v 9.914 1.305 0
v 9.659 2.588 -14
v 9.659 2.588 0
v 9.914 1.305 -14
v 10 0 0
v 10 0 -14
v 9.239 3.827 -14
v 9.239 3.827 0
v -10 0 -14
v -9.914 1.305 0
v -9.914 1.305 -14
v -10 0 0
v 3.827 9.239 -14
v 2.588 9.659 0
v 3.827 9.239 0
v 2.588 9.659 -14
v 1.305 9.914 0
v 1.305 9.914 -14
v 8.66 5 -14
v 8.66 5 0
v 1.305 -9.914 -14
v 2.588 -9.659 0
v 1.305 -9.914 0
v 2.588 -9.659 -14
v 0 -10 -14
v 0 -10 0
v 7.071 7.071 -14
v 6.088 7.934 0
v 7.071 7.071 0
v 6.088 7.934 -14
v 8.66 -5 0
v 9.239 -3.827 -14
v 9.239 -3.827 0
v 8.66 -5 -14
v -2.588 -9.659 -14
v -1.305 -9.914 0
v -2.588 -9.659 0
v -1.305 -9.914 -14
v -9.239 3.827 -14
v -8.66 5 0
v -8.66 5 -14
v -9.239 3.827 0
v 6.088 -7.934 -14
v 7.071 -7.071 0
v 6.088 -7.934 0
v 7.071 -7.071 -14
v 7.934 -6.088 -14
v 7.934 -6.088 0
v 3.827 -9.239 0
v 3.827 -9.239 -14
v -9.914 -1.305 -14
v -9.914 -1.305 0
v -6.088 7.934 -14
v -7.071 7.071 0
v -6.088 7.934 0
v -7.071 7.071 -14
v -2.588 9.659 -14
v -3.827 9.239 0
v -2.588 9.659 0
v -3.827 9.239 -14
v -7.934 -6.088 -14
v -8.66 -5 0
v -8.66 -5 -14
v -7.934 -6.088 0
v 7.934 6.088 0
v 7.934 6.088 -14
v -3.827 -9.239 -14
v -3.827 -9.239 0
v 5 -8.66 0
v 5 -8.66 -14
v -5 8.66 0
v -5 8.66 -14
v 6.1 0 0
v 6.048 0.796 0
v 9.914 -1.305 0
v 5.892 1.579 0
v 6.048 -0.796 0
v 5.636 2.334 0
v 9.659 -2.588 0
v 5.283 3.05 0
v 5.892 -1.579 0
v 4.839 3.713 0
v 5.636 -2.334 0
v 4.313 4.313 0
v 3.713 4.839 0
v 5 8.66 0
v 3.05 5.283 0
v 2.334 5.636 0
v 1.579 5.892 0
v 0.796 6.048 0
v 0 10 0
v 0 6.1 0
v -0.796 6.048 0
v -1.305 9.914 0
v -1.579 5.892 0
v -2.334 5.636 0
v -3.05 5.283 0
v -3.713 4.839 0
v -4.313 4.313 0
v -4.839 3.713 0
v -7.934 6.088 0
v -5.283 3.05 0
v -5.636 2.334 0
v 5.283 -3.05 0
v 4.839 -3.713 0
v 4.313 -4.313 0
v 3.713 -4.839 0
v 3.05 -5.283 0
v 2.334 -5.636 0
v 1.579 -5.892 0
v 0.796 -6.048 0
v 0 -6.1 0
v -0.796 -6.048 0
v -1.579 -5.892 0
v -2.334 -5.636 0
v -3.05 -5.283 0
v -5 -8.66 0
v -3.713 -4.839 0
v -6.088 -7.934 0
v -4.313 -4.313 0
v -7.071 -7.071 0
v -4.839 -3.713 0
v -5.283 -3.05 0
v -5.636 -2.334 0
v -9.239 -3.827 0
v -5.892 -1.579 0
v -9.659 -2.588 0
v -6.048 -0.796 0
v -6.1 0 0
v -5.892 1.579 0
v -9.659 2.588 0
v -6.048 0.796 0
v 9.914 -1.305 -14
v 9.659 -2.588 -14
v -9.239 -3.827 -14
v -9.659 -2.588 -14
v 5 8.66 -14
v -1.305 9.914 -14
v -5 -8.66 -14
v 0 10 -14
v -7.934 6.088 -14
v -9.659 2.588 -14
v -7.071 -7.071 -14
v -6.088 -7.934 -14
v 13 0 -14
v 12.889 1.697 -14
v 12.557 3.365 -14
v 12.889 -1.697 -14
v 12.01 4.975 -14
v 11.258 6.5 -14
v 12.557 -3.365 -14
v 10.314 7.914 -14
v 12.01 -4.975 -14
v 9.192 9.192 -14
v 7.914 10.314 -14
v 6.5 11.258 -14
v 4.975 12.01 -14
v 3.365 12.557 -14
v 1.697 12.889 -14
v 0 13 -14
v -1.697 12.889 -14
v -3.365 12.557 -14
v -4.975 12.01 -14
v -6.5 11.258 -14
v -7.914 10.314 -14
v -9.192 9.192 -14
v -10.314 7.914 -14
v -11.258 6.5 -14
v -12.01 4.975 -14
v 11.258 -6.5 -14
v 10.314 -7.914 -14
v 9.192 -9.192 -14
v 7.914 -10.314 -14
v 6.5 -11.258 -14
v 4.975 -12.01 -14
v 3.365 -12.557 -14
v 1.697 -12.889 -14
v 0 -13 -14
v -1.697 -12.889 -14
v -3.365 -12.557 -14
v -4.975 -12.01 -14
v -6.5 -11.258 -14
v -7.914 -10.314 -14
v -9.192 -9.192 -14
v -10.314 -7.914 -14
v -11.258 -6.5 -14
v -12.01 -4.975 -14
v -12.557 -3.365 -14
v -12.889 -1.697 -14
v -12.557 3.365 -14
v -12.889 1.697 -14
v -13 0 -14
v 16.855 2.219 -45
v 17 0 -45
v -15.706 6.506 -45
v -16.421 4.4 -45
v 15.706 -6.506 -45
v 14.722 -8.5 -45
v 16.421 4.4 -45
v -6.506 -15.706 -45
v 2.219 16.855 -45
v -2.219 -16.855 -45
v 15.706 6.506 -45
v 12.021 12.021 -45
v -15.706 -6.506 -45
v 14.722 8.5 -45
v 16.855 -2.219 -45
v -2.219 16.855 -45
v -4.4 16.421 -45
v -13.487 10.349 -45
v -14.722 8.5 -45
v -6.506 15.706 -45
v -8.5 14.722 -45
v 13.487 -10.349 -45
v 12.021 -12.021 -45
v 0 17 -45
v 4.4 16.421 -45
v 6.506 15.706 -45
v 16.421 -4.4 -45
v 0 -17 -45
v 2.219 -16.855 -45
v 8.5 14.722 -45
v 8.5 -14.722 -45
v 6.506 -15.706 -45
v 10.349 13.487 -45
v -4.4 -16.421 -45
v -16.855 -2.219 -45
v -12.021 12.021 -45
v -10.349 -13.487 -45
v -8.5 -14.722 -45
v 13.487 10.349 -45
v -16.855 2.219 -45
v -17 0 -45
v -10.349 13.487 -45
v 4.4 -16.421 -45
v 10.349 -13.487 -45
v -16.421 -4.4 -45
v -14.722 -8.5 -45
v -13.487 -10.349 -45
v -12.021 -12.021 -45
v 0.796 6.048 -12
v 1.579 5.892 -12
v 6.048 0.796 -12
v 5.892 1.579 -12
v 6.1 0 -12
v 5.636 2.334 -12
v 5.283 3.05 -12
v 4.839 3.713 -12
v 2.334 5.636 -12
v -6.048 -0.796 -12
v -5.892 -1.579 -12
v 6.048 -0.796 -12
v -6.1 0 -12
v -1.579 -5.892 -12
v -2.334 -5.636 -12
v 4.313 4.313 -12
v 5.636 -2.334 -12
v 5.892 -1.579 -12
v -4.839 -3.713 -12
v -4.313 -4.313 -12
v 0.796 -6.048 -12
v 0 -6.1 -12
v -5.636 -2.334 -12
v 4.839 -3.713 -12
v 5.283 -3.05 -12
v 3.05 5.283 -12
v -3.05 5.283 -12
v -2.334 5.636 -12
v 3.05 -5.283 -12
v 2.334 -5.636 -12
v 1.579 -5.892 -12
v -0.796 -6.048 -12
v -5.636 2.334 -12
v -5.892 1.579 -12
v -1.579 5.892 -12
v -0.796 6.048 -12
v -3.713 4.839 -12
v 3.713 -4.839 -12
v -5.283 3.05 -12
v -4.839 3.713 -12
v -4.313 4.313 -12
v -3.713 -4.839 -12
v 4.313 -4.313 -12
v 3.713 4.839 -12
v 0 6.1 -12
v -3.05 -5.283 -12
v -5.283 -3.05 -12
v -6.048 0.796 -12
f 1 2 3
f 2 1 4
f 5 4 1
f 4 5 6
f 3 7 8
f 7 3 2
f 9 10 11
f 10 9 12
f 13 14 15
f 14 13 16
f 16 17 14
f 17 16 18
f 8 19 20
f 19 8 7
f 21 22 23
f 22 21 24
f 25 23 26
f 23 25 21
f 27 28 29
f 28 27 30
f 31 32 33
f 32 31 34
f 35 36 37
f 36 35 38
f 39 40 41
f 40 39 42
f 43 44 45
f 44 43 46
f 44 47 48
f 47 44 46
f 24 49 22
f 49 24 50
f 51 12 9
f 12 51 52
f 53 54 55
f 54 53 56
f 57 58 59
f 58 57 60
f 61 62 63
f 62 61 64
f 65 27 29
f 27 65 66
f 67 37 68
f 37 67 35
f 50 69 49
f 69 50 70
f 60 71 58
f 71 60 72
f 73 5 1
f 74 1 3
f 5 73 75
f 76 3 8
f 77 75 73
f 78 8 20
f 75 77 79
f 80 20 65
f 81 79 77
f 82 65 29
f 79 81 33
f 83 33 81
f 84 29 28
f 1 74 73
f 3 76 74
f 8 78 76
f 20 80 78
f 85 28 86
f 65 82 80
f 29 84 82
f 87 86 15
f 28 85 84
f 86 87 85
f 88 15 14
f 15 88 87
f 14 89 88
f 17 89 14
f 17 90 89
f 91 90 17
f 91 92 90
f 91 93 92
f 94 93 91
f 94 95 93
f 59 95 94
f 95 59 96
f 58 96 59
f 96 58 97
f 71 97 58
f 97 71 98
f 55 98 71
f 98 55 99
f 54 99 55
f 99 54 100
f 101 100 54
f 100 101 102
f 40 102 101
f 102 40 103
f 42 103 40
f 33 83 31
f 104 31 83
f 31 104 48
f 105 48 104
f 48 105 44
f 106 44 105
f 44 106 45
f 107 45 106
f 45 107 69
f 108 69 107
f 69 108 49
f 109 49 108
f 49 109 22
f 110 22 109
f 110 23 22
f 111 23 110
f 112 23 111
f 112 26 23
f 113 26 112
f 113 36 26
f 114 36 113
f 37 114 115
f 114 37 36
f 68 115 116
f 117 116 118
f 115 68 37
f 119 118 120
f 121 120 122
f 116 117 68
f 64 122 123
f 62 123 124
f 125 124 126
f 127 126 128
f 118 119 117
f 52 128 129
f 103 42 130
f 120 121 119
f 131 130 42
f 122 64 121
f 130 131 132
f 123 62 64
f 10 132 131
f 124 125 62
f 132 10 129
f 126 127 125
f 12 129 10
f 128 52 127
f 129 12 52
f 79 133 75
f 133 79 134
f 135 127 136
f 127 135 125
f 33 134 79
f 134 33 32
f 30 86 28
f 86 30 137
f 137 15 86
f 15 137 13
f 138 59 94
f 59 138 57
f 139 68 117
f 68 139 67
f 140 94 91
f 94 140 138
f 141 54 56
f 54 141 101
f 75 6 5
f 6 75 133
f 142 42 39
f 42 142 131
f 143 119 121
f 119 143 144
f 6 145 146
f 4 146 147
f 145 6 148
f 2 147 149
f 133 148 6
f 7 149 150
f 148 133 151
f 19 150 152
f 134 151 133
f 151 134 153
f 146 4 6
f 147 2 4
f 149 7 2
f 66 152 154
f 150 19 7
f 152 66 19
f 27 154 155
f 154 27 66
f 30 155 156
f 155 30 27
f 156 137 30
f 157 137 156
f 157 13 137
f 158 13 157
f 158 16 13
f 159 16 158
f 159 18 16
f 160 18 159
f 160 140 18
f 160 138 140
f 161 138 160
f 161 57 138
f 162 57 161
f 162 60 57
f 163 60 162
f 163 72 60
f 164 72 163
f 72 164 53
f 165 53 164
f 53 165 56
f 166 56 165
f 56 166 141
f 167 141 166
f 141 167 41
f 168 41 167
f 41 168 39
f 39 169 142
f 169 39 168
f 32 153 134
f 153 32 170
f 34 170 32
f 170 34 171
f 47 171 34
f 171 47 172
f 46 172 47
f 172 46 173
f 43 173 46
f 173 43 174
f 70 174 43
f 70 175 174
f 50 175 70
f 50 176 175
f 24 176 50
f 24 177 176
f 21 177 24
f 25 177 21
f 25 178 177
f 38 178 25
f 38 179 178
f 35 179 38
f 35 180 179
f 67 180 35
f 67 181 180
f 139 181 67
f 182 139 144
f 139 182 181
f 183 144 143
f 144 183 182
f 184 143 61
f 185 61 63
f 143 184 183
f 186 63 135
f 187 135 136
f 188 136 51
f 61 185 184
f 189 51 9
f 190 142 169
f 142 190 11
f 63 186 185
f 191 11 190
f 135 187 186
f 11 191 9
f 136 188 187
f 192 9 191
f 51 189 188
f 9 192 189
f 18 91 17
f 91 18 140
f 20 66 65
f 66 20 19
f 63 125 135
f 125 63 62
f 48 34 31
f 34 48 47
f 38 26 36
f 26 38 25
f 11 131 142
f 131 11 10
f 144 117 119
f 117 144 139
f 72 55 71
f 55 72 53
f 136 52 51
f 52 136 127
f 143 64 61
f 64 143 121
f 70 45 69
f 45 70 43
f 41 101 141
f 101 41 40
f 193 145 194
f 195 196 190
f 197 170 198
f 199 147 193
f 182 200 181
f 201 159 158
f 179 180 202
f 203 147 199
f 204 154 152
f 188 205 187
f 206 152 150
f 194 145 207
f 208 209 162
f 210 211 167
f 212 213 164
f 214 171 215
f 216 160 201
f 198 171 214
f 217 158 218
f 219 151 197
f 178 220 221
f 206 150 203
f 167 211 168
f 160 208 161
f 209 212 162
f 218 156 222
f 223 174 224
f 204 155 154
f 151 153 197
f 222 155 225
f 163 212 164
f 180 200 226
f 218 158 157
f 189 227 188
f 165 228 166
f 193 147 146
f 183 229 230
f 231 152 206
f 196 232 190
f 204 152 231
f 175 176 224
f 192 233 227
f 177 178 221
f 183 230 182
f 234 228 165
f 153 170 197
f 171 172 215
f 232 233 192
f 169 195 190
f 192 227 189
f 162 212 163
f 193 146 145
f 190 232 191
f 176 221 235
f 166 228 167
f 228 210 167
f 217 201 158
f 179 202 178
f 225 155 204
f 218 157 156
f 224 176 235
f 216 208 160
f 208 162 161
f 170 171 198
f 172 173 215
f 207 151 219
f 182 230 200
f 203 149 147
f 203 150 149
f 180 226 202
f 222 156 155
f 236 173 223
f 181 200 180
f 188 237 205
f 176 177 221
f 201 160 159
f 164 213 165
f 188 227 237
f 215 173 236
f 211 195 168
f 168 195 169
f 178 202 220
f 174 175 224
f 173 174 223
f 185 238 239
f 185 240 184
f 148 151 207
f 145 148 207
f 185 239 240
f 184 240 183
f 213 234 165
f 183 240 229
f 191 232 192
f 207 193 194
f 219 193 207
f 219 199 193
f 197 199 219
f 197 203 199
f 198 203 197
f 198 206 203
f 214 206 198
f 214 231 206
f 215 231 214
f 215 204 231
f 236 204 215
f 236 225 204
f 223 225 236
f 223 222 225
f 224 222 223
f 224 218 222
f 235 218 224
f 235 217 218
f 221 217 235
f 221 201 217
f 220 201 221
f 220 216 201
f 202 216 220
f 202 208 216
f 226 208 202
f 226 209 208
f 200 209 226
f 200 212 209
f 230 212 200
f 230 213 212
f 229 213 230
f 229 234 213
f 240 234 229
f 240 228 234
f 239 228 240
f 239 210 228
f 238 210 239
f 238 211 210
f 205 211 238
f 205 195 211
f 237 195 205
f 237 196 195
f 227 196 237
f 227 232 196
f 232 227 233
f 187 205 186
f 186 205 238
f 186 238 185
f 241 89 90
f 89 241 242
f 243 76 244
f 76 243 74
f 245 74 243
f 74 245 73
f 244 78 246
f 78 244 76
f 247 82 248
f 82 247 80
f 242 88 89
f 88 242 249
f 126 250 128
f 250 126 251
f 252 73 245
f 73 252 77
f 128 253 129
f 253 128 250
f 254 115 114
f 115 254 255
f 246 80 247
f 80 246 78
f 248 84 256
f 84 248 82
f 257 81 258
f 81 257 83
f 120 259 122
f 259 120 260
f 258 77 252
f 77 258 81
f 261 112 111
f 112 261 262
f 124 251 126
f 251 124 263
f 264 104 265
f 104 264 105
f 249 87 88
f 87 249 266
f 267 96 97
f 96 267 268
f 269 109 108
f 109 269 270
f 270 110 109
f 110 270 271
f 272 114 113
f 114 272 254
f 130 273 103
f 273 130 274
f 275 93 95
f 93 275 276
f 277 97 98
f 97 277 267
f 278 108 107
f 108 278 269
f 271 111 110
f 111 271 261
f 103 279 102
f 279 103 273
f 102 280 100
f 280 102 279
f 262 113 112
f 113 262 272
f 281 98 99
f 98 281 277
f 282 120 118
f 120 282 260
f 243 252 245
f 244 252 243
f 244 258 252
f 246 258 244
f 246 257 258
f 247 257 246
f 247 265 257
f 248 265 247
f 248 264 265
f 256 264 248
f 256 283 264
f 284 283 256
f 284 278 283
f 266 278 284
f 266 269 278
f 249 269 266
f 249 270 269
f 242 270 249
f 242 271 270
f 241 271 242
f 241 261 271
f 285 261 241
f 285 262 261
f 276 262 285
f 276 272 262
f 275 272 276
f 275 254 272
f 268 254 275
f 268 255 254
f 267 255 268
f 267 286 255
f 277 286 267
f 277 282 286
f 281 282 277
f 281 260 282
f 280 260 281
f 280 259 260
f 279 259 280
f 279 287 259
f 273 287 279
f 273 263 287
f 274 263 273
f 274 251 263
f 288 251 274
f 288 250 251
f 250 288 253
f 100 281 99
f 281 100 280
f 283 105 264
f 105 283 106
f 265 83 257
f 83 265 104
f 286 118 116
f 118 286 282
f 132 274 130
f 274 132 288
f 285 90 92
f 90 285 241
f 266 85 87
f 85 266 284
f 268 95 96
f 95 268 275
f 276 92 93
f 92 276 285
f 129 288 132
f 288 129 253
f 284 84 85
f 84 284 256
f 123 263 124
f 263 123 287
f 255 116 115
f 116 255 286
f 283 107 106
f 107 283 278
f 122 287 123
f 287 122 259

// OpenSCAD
// file: ../common/ds_lib.scad
// DronSwarm · librería común de piezas del frame (S07-S08). Unidades: mm.
//
// Reglas (ADR-003): sin hull()/minkowski()/offset() — FreeCAD los convierte en malla y el STEP deja de ser un
// sólido válido. Las formas redondeadas se arman con uniones de cubos y cilindros. El importador CSG de FreeCAD
// también falla con booleanas 2D y con varios operandos agrupados bajo una sola transformación: cada grupo de
// agujeros debe ser hijo directo del difference(), con su propio translate.
//
// Interfaz de motor DronSwarm (DMI, ADR-011): placa con 4 ranuras radiales a 90°, de modo que el mismo soporte
// acepta varios patrones comerciales y, más adelante, el motor propio (S17+) se diseña para caer en el mismo rango.
//   DMI-S: 4×M3, círculo de tornillos Ø16-Ø25 (motores 28xx-41xx, ≤ 600 W)
//   DMI-L: 4×M4, círculo de tornillos Ø30-Ø42 (motores 50xx-70xx, ≤ 2 kW)

$fn = 48;

M3 = 3.3; M3_HEAD = 6.0; M3_NUT = 6.4;     // pasante, cabeza, tuerca (entre caras + juego)
M4 = 4.4; M4_HEAD = 7.5;
M5 = 5.4;

function dmi_bolt(iface) = iface == "L" ? M4 : M3;
function dmi_r(iface) = iface == "L" ? [15, 21] : [8, 12.5];   // radio mínimo y máximo de las ranuras
function dmi_plate_d(iface) = iface == "L" ? 56 : 36;
function dmi_center(iface) = iface == "L" ? 16 : 10;            // eje, seguro y paso de cables

// Rectángulo con esquinas redondeadas (2D) y su extrusión
module rrect2d(size, r) {
    r2 = min(r, size[0] / 2 - 0.01, size[1] / 2 - 0.01);
    union() {
        translate([r2, 0]) square([size[0] - 2 * r2, size[1]]);
        translate([0, r2]) square([size[0], size[1] - 2 * r2]);
        for (x = [r2, size[0] - r2], y = [r2, size[1] - r2]) translate([x, y]) circle(r = r2);
    }
}
// Caja redondeada con primitivas 3D (sin booleanas 2D: el importador CSG de FreeCAD falla con ellas)
module rbox(size, r) {
    r2 = min(r, size[0] / 2 - 0.01, size[1] / 2 - 0.01);
    union() {
        translate([r2, 0, 0]) cube([size[0] - 2 * r2, size[1], size[2]]);
        translate([0, r2, 0]) cube([size[0], size[1] - 2 * r2, size[2]]);
        for (x = [r2, size[0] - r2], y = [r2, size[1] - r2]) translate([x, y, 0]) cylinder(r = r2, h = size[2]);
    }
}
module crbox(size, r) { translate([-size[0] / 2, -size[1] / 2, 0]) rbox(size, r); }   // centrado en x/y

// Ranura (2D) entre dos puntos sobre el eje x
module slot2d(r0, r1, w) {
    union() {
        translate([r0, -w / 2]) square([r1 - r0, w]);
        translate([r0, 0]) circle(d = w);
        translate([r1, 0]) circle(d = w);
    }
}

// Agujeros de la interfaz de motor (para restar de una placa de espesor t)
module slot3d(r0, r1, w, h) {
    union() {
        translate([r0, -w / 2, 0]) cube([r1 - r0, w, h]);
        translate([r0, 0, 0]) cylinder(d = w, h = h);
        translate([r1, 0, 0]) cylinder(d = w, h = h);
    }
}
module dmi_holes(iface, t) {
    r = dmi_r(iface);
    translate([0, 0, -1]) union() {
        cylinder(d = dmi_center(iface), h = t + 2);
        for (a = [45, 135, 225, 315]) rotate(a) slot3d(r[0], r[1], dmi_bolt(iface), t + 2);
    }
}

// Soporte de motor en la punta del brazo: manguito sobre el tubo + placa DMI arriba
//   el tubo entra por -x; la placa queda centrada en el eje del motor (origen), cara superior en z = 0
module motor_mount(tube_d, iface = "S", sleeve = 34, wall = 3.5) {
    od = tube_d + 2 * wall;
    pd = dmi_plate_d(iface);
    pt = iface == "L" ? 6 : 4;
    zc = -pt - tube_d / 2 - 1;                 // eje del tubo bajo la placa
    difference() {
        union() {
            translate([0, 0, -pt]) cylinder(d = pd, h = pt);                         // placa DMI
            translate([-sleeve - pd / 2 + 6, 0, zc]) rotate([0, 90, 0])
                cylinder(d = od, h = sleeve + pd / 2 - 6 + 4);                       // manguito
            translate([-sleeve - pd / 2 + 6, -od / 2, zc]) cube([sleeve + pd / 2 - 2, od, -zc - pt + 0.01]);  // alma
            translate([-sleeve - pd / 2 + 6, -5, zc - od / 2 - 7]) cube([sleeve, 10, 8]);   // oreja de apriete
        }
        dmi_holes(iface, pt + 0.02, $fn = 32);
        translate([-sleeve - pd / 2 + 5, 0, zc]) rotate([0, 90, 0]) cylinder(d = tube_d + 0.3, h = sleeve + pd / 2 - 3); // tubo
        translate([-sleeve - pd / 2 + 4, -1, zc - od / 2 - 8]) cube([sleeve + 1, 2, od / 2 + 6]);   // ranura de apriete
        for (x = [0.3, 0.75]) translate([-sleeve - pd / 2 + 6 + x * sleeve, 0, zc - od / 2 - 3])
            rotate([90, 0, 0]) cylinder(d = M3, h = 30, center = true);                // tornillos de apriete
        translate([-pd / 2 - 2, 0, zc]) rotate([0, 90, 0]) cylinder(d = 7, h = pd);   // salida de cables del tubo
    }
}

// Bloque de brazo entre las dos placas centrales (impreso PA12-CF): sujeta el tubo y separa las placas.
//   el tubo sale por +x desde el origen; el bloque ocupa x ∈ [-len, 0], altura = gap
module arm_block(tube_d, gap, len = 40, width = 0, bolt = M3) {
    w = width > 0 ? width : tube_d + 14;
    difference() {
        translate([-len, -w / 2, 0]) rbox([len, w, gap], 2);
        translate([-len - 1, 0, gap / 2]) rotate([0, 90, 0]) cylinder(d = tube_d + 0.2, h = len + 2);   // tubo
        translate([-len - 1, -0.75, gap / 2]) cube([len + 2, 1.5, gap / 2 + 1]);                        // ranura de apriete
        for (p = arm_block_bolts(tube_d, len, w)) translate([p[0], p[1], -1]) cylinder(d = bolt, h = gap + 2);
        translate([-len * 0.5, 0, gap * 0.78]) rotate([90, 0, 0]) cylinder(d = M3, h = w + 2, center = true);  // apriete
    }
}
function arm_block_bolts(tube_d, len, w) =
    [for (x = [-len + 6, -6], y = [-(w / 2 - 3.6), w / 2 - 3.6]) [x, y]];

// Patrón de controladora de vuelo (agujeros M3 en cuadrado)
module fc_holes(pattern, t) {
    for (x = [-1, 1], y = [-1, 1]) translate([x * pattern / 2, y * pattern / 2, -1]) cylinder(d = M3, h = t + 2);
}
// file: ds_i_params.scad
// DS-I · parámetros generados por tools/cad/gen_cad_params.py el 2026-10-19
// desde engineering/data/results (spec v1). No editar a mano: regenerar. Unidades: mm, kg.

vehicle = "DS-I";
rotors = 4;
wheelbase = 672;
arm_radius = 336;
prop_d = 431.8;
tube_od = 20;
tube_wall = 1;
arm_len = 252;
plate_d = 168;
plate_t = 3;
plate_gap = 26;
motor_iface = "S";
battery_dims = [134.4, 76.2, 48.8];
battery = "6S2P 50S";
leg_h = 160;
fold_arms = false;
mtow_kg = 2.695;
motor_mass_kg = 0.074;
fc_pattern = 30.5;
gimbal_box = [90, 70, 105];
gimbal_damper_pitch = [60, 50];
// file: ds_i_frame.scad
// DS-I · geometría compartida del frame: posiciones derivadas de los parámetros (spec v1). Unidades: mm.
// Ejes: x adelante, y izquierda, z arriba. z = 0 es la cara superior de la placa inferior.
// Cada pieza vive en su propio archivo (center_plate.scad, arm_block.scad, …) e incluye este.

include <ds_i_params.scad>
use <../common/ds_lib.scad>
include <../common/ds_lib.scad>

arm_angles = [45, 135, 225, 315];         // quad X
block_len = 40;
block_w = tube_od + 14;
r_block_out = plate_d / 2 - 3;            // extremo exterior del bloque de brazo
tube_z = plate_gap / 2;                   // eje de los tubos
tube_len = arm_radius - r_block_out + block_len - 8;   // dentro del bloque hasta el soporte de motor
leg_offset = 70;                          // patas abrazadas al brazo, a esta distancia del bloque
leg_r = r_block_out + leg_offset;
leg_tube = 12;                            // tubo de las patas Ø12×1
battery_pos = [-28, 0];                   // batería transversal, atrás, bajo la placa
gimbal_pos = [62, 0];                     // cámara adelante, colgada con amortiguadores
housing_size = [120, 90, 58];             // carcasa IP54 sobre la placa superior
housing_pos = [0, 0];

// Contorno de las placas centrales (2D): círculo con lóbulos bajo cada bloque de brazo
module plate_outline() {
    union() {
        circle(d = plate_d, $fn = 96);
        for (a = arm_angles) rotate(a) translate([r_block_out - block_len - 4, -block_w / 2 - 4]) square([block_len + 7, block_w + 8]);
    }
}

// Agujeros comunes a ambas placas: tornillos de los bloques
module plate_common_holes() {
    for (a = arm_angles) rotate(a) translate([r_block_out, 0])
        for (p = arm_block_bolts(tube_od, block_len, block_w)) translate(p) circle(d = M3);
}

// Posiciones de piezas montadas en las placas
gimbal_mount_bolts = [for (x = [-25, 25], y = [-32, 32]) [gimbal_pos[0] - 15 + x, y]];   // adaptador bajo la placa
battery_tray_bolts = [for (x = [-30, 30], y = [-46, 46]) [battery_pos[0] + x, y]];
housing_flange = 10;
// tornillos de la brida a 6 mm de la pared (afuera del canal de la junta, que va de 0.6 a 2.6 mm)
housing_bolts = [[66, 0], [-66, 0], [0, 51], [0, -51], [40, 51], [40, -51], [-40, 51], [-40, -51]];
cable_gland_pos = [-housing_size[0] / 2 + 18, 0];      // paso de cables al interior de la carcasa (prensaestopa M12)
motor_d = motor_iface == "L" ? 62 : 38;   // motor de referencia (COTS, se confirma en S09)
motor_h = motor_iface == "L" ? 36 : 26;
tray_t = 3;                               // bandeja de batería
gm_t = 4;                                 // placas del adaptador de cámara
damper_h = 10;                            // amortiguadores de silicona
foot_h = 45;                              // pie amortiguador de TPU (≈ 30 mm de carrera)
foot_stroke = 30;
// Altura de las patas por condición de diseño: con el pie comprimido, la cámara no toca el suelo (10 mm de margen)
gimbal_bottom_z = -plate_t - 2 * gm_t - damper_h - gimbal_box[2];
ground_z = gimbal_bottom_z - foot_stroke - 10;
leg_top_z = tube_z - (tube_od + 8) / 2 - 2;     // tope del tubo de la pata dentro de la abrazadera
leg_len = (leg_top_z - ground_z) - (foot_h - 12);
mm_sleeve = 26;                           // manguito del soporte de motor (FEA: FS 37 con 34 mm, se acorta)
// main file
// DS-I · pie amortiguador de la pata (impreso TPU 85A, relleno giroide 15 %, 2 perímetros, ×4).
// Es el elemento elástico del tren: ≈ 30 mm de carrera útil, rigidez ≈ 30 N/mm. Con un pie macizo de TPU 95A el
// tren queda casi rígido (≈ 750 N/mm) y una caída de 1 m daría ≈ 4.5 kN por pata (ver docs/ingenieria/fea_frames.md).
// Local: el tubo de la pata encaja desde z = 0 hacia abajo (12 mm); el pie llega a z = −foot_h.
include <ds_i_frame.scad>
module foot() difference() {
    union() {
        translate([0, 0, -14]) cylinder(d = leg_tube + 8, h = 14);
        translate([0, 0, -foot_h]) cylinder(d1 = 34, d2 = 26, h = foot_h - 14);
    }
    translate([0, 0, -12]) cylinder(d = leg_tube + 0.2, h = 13);
}
foot();
